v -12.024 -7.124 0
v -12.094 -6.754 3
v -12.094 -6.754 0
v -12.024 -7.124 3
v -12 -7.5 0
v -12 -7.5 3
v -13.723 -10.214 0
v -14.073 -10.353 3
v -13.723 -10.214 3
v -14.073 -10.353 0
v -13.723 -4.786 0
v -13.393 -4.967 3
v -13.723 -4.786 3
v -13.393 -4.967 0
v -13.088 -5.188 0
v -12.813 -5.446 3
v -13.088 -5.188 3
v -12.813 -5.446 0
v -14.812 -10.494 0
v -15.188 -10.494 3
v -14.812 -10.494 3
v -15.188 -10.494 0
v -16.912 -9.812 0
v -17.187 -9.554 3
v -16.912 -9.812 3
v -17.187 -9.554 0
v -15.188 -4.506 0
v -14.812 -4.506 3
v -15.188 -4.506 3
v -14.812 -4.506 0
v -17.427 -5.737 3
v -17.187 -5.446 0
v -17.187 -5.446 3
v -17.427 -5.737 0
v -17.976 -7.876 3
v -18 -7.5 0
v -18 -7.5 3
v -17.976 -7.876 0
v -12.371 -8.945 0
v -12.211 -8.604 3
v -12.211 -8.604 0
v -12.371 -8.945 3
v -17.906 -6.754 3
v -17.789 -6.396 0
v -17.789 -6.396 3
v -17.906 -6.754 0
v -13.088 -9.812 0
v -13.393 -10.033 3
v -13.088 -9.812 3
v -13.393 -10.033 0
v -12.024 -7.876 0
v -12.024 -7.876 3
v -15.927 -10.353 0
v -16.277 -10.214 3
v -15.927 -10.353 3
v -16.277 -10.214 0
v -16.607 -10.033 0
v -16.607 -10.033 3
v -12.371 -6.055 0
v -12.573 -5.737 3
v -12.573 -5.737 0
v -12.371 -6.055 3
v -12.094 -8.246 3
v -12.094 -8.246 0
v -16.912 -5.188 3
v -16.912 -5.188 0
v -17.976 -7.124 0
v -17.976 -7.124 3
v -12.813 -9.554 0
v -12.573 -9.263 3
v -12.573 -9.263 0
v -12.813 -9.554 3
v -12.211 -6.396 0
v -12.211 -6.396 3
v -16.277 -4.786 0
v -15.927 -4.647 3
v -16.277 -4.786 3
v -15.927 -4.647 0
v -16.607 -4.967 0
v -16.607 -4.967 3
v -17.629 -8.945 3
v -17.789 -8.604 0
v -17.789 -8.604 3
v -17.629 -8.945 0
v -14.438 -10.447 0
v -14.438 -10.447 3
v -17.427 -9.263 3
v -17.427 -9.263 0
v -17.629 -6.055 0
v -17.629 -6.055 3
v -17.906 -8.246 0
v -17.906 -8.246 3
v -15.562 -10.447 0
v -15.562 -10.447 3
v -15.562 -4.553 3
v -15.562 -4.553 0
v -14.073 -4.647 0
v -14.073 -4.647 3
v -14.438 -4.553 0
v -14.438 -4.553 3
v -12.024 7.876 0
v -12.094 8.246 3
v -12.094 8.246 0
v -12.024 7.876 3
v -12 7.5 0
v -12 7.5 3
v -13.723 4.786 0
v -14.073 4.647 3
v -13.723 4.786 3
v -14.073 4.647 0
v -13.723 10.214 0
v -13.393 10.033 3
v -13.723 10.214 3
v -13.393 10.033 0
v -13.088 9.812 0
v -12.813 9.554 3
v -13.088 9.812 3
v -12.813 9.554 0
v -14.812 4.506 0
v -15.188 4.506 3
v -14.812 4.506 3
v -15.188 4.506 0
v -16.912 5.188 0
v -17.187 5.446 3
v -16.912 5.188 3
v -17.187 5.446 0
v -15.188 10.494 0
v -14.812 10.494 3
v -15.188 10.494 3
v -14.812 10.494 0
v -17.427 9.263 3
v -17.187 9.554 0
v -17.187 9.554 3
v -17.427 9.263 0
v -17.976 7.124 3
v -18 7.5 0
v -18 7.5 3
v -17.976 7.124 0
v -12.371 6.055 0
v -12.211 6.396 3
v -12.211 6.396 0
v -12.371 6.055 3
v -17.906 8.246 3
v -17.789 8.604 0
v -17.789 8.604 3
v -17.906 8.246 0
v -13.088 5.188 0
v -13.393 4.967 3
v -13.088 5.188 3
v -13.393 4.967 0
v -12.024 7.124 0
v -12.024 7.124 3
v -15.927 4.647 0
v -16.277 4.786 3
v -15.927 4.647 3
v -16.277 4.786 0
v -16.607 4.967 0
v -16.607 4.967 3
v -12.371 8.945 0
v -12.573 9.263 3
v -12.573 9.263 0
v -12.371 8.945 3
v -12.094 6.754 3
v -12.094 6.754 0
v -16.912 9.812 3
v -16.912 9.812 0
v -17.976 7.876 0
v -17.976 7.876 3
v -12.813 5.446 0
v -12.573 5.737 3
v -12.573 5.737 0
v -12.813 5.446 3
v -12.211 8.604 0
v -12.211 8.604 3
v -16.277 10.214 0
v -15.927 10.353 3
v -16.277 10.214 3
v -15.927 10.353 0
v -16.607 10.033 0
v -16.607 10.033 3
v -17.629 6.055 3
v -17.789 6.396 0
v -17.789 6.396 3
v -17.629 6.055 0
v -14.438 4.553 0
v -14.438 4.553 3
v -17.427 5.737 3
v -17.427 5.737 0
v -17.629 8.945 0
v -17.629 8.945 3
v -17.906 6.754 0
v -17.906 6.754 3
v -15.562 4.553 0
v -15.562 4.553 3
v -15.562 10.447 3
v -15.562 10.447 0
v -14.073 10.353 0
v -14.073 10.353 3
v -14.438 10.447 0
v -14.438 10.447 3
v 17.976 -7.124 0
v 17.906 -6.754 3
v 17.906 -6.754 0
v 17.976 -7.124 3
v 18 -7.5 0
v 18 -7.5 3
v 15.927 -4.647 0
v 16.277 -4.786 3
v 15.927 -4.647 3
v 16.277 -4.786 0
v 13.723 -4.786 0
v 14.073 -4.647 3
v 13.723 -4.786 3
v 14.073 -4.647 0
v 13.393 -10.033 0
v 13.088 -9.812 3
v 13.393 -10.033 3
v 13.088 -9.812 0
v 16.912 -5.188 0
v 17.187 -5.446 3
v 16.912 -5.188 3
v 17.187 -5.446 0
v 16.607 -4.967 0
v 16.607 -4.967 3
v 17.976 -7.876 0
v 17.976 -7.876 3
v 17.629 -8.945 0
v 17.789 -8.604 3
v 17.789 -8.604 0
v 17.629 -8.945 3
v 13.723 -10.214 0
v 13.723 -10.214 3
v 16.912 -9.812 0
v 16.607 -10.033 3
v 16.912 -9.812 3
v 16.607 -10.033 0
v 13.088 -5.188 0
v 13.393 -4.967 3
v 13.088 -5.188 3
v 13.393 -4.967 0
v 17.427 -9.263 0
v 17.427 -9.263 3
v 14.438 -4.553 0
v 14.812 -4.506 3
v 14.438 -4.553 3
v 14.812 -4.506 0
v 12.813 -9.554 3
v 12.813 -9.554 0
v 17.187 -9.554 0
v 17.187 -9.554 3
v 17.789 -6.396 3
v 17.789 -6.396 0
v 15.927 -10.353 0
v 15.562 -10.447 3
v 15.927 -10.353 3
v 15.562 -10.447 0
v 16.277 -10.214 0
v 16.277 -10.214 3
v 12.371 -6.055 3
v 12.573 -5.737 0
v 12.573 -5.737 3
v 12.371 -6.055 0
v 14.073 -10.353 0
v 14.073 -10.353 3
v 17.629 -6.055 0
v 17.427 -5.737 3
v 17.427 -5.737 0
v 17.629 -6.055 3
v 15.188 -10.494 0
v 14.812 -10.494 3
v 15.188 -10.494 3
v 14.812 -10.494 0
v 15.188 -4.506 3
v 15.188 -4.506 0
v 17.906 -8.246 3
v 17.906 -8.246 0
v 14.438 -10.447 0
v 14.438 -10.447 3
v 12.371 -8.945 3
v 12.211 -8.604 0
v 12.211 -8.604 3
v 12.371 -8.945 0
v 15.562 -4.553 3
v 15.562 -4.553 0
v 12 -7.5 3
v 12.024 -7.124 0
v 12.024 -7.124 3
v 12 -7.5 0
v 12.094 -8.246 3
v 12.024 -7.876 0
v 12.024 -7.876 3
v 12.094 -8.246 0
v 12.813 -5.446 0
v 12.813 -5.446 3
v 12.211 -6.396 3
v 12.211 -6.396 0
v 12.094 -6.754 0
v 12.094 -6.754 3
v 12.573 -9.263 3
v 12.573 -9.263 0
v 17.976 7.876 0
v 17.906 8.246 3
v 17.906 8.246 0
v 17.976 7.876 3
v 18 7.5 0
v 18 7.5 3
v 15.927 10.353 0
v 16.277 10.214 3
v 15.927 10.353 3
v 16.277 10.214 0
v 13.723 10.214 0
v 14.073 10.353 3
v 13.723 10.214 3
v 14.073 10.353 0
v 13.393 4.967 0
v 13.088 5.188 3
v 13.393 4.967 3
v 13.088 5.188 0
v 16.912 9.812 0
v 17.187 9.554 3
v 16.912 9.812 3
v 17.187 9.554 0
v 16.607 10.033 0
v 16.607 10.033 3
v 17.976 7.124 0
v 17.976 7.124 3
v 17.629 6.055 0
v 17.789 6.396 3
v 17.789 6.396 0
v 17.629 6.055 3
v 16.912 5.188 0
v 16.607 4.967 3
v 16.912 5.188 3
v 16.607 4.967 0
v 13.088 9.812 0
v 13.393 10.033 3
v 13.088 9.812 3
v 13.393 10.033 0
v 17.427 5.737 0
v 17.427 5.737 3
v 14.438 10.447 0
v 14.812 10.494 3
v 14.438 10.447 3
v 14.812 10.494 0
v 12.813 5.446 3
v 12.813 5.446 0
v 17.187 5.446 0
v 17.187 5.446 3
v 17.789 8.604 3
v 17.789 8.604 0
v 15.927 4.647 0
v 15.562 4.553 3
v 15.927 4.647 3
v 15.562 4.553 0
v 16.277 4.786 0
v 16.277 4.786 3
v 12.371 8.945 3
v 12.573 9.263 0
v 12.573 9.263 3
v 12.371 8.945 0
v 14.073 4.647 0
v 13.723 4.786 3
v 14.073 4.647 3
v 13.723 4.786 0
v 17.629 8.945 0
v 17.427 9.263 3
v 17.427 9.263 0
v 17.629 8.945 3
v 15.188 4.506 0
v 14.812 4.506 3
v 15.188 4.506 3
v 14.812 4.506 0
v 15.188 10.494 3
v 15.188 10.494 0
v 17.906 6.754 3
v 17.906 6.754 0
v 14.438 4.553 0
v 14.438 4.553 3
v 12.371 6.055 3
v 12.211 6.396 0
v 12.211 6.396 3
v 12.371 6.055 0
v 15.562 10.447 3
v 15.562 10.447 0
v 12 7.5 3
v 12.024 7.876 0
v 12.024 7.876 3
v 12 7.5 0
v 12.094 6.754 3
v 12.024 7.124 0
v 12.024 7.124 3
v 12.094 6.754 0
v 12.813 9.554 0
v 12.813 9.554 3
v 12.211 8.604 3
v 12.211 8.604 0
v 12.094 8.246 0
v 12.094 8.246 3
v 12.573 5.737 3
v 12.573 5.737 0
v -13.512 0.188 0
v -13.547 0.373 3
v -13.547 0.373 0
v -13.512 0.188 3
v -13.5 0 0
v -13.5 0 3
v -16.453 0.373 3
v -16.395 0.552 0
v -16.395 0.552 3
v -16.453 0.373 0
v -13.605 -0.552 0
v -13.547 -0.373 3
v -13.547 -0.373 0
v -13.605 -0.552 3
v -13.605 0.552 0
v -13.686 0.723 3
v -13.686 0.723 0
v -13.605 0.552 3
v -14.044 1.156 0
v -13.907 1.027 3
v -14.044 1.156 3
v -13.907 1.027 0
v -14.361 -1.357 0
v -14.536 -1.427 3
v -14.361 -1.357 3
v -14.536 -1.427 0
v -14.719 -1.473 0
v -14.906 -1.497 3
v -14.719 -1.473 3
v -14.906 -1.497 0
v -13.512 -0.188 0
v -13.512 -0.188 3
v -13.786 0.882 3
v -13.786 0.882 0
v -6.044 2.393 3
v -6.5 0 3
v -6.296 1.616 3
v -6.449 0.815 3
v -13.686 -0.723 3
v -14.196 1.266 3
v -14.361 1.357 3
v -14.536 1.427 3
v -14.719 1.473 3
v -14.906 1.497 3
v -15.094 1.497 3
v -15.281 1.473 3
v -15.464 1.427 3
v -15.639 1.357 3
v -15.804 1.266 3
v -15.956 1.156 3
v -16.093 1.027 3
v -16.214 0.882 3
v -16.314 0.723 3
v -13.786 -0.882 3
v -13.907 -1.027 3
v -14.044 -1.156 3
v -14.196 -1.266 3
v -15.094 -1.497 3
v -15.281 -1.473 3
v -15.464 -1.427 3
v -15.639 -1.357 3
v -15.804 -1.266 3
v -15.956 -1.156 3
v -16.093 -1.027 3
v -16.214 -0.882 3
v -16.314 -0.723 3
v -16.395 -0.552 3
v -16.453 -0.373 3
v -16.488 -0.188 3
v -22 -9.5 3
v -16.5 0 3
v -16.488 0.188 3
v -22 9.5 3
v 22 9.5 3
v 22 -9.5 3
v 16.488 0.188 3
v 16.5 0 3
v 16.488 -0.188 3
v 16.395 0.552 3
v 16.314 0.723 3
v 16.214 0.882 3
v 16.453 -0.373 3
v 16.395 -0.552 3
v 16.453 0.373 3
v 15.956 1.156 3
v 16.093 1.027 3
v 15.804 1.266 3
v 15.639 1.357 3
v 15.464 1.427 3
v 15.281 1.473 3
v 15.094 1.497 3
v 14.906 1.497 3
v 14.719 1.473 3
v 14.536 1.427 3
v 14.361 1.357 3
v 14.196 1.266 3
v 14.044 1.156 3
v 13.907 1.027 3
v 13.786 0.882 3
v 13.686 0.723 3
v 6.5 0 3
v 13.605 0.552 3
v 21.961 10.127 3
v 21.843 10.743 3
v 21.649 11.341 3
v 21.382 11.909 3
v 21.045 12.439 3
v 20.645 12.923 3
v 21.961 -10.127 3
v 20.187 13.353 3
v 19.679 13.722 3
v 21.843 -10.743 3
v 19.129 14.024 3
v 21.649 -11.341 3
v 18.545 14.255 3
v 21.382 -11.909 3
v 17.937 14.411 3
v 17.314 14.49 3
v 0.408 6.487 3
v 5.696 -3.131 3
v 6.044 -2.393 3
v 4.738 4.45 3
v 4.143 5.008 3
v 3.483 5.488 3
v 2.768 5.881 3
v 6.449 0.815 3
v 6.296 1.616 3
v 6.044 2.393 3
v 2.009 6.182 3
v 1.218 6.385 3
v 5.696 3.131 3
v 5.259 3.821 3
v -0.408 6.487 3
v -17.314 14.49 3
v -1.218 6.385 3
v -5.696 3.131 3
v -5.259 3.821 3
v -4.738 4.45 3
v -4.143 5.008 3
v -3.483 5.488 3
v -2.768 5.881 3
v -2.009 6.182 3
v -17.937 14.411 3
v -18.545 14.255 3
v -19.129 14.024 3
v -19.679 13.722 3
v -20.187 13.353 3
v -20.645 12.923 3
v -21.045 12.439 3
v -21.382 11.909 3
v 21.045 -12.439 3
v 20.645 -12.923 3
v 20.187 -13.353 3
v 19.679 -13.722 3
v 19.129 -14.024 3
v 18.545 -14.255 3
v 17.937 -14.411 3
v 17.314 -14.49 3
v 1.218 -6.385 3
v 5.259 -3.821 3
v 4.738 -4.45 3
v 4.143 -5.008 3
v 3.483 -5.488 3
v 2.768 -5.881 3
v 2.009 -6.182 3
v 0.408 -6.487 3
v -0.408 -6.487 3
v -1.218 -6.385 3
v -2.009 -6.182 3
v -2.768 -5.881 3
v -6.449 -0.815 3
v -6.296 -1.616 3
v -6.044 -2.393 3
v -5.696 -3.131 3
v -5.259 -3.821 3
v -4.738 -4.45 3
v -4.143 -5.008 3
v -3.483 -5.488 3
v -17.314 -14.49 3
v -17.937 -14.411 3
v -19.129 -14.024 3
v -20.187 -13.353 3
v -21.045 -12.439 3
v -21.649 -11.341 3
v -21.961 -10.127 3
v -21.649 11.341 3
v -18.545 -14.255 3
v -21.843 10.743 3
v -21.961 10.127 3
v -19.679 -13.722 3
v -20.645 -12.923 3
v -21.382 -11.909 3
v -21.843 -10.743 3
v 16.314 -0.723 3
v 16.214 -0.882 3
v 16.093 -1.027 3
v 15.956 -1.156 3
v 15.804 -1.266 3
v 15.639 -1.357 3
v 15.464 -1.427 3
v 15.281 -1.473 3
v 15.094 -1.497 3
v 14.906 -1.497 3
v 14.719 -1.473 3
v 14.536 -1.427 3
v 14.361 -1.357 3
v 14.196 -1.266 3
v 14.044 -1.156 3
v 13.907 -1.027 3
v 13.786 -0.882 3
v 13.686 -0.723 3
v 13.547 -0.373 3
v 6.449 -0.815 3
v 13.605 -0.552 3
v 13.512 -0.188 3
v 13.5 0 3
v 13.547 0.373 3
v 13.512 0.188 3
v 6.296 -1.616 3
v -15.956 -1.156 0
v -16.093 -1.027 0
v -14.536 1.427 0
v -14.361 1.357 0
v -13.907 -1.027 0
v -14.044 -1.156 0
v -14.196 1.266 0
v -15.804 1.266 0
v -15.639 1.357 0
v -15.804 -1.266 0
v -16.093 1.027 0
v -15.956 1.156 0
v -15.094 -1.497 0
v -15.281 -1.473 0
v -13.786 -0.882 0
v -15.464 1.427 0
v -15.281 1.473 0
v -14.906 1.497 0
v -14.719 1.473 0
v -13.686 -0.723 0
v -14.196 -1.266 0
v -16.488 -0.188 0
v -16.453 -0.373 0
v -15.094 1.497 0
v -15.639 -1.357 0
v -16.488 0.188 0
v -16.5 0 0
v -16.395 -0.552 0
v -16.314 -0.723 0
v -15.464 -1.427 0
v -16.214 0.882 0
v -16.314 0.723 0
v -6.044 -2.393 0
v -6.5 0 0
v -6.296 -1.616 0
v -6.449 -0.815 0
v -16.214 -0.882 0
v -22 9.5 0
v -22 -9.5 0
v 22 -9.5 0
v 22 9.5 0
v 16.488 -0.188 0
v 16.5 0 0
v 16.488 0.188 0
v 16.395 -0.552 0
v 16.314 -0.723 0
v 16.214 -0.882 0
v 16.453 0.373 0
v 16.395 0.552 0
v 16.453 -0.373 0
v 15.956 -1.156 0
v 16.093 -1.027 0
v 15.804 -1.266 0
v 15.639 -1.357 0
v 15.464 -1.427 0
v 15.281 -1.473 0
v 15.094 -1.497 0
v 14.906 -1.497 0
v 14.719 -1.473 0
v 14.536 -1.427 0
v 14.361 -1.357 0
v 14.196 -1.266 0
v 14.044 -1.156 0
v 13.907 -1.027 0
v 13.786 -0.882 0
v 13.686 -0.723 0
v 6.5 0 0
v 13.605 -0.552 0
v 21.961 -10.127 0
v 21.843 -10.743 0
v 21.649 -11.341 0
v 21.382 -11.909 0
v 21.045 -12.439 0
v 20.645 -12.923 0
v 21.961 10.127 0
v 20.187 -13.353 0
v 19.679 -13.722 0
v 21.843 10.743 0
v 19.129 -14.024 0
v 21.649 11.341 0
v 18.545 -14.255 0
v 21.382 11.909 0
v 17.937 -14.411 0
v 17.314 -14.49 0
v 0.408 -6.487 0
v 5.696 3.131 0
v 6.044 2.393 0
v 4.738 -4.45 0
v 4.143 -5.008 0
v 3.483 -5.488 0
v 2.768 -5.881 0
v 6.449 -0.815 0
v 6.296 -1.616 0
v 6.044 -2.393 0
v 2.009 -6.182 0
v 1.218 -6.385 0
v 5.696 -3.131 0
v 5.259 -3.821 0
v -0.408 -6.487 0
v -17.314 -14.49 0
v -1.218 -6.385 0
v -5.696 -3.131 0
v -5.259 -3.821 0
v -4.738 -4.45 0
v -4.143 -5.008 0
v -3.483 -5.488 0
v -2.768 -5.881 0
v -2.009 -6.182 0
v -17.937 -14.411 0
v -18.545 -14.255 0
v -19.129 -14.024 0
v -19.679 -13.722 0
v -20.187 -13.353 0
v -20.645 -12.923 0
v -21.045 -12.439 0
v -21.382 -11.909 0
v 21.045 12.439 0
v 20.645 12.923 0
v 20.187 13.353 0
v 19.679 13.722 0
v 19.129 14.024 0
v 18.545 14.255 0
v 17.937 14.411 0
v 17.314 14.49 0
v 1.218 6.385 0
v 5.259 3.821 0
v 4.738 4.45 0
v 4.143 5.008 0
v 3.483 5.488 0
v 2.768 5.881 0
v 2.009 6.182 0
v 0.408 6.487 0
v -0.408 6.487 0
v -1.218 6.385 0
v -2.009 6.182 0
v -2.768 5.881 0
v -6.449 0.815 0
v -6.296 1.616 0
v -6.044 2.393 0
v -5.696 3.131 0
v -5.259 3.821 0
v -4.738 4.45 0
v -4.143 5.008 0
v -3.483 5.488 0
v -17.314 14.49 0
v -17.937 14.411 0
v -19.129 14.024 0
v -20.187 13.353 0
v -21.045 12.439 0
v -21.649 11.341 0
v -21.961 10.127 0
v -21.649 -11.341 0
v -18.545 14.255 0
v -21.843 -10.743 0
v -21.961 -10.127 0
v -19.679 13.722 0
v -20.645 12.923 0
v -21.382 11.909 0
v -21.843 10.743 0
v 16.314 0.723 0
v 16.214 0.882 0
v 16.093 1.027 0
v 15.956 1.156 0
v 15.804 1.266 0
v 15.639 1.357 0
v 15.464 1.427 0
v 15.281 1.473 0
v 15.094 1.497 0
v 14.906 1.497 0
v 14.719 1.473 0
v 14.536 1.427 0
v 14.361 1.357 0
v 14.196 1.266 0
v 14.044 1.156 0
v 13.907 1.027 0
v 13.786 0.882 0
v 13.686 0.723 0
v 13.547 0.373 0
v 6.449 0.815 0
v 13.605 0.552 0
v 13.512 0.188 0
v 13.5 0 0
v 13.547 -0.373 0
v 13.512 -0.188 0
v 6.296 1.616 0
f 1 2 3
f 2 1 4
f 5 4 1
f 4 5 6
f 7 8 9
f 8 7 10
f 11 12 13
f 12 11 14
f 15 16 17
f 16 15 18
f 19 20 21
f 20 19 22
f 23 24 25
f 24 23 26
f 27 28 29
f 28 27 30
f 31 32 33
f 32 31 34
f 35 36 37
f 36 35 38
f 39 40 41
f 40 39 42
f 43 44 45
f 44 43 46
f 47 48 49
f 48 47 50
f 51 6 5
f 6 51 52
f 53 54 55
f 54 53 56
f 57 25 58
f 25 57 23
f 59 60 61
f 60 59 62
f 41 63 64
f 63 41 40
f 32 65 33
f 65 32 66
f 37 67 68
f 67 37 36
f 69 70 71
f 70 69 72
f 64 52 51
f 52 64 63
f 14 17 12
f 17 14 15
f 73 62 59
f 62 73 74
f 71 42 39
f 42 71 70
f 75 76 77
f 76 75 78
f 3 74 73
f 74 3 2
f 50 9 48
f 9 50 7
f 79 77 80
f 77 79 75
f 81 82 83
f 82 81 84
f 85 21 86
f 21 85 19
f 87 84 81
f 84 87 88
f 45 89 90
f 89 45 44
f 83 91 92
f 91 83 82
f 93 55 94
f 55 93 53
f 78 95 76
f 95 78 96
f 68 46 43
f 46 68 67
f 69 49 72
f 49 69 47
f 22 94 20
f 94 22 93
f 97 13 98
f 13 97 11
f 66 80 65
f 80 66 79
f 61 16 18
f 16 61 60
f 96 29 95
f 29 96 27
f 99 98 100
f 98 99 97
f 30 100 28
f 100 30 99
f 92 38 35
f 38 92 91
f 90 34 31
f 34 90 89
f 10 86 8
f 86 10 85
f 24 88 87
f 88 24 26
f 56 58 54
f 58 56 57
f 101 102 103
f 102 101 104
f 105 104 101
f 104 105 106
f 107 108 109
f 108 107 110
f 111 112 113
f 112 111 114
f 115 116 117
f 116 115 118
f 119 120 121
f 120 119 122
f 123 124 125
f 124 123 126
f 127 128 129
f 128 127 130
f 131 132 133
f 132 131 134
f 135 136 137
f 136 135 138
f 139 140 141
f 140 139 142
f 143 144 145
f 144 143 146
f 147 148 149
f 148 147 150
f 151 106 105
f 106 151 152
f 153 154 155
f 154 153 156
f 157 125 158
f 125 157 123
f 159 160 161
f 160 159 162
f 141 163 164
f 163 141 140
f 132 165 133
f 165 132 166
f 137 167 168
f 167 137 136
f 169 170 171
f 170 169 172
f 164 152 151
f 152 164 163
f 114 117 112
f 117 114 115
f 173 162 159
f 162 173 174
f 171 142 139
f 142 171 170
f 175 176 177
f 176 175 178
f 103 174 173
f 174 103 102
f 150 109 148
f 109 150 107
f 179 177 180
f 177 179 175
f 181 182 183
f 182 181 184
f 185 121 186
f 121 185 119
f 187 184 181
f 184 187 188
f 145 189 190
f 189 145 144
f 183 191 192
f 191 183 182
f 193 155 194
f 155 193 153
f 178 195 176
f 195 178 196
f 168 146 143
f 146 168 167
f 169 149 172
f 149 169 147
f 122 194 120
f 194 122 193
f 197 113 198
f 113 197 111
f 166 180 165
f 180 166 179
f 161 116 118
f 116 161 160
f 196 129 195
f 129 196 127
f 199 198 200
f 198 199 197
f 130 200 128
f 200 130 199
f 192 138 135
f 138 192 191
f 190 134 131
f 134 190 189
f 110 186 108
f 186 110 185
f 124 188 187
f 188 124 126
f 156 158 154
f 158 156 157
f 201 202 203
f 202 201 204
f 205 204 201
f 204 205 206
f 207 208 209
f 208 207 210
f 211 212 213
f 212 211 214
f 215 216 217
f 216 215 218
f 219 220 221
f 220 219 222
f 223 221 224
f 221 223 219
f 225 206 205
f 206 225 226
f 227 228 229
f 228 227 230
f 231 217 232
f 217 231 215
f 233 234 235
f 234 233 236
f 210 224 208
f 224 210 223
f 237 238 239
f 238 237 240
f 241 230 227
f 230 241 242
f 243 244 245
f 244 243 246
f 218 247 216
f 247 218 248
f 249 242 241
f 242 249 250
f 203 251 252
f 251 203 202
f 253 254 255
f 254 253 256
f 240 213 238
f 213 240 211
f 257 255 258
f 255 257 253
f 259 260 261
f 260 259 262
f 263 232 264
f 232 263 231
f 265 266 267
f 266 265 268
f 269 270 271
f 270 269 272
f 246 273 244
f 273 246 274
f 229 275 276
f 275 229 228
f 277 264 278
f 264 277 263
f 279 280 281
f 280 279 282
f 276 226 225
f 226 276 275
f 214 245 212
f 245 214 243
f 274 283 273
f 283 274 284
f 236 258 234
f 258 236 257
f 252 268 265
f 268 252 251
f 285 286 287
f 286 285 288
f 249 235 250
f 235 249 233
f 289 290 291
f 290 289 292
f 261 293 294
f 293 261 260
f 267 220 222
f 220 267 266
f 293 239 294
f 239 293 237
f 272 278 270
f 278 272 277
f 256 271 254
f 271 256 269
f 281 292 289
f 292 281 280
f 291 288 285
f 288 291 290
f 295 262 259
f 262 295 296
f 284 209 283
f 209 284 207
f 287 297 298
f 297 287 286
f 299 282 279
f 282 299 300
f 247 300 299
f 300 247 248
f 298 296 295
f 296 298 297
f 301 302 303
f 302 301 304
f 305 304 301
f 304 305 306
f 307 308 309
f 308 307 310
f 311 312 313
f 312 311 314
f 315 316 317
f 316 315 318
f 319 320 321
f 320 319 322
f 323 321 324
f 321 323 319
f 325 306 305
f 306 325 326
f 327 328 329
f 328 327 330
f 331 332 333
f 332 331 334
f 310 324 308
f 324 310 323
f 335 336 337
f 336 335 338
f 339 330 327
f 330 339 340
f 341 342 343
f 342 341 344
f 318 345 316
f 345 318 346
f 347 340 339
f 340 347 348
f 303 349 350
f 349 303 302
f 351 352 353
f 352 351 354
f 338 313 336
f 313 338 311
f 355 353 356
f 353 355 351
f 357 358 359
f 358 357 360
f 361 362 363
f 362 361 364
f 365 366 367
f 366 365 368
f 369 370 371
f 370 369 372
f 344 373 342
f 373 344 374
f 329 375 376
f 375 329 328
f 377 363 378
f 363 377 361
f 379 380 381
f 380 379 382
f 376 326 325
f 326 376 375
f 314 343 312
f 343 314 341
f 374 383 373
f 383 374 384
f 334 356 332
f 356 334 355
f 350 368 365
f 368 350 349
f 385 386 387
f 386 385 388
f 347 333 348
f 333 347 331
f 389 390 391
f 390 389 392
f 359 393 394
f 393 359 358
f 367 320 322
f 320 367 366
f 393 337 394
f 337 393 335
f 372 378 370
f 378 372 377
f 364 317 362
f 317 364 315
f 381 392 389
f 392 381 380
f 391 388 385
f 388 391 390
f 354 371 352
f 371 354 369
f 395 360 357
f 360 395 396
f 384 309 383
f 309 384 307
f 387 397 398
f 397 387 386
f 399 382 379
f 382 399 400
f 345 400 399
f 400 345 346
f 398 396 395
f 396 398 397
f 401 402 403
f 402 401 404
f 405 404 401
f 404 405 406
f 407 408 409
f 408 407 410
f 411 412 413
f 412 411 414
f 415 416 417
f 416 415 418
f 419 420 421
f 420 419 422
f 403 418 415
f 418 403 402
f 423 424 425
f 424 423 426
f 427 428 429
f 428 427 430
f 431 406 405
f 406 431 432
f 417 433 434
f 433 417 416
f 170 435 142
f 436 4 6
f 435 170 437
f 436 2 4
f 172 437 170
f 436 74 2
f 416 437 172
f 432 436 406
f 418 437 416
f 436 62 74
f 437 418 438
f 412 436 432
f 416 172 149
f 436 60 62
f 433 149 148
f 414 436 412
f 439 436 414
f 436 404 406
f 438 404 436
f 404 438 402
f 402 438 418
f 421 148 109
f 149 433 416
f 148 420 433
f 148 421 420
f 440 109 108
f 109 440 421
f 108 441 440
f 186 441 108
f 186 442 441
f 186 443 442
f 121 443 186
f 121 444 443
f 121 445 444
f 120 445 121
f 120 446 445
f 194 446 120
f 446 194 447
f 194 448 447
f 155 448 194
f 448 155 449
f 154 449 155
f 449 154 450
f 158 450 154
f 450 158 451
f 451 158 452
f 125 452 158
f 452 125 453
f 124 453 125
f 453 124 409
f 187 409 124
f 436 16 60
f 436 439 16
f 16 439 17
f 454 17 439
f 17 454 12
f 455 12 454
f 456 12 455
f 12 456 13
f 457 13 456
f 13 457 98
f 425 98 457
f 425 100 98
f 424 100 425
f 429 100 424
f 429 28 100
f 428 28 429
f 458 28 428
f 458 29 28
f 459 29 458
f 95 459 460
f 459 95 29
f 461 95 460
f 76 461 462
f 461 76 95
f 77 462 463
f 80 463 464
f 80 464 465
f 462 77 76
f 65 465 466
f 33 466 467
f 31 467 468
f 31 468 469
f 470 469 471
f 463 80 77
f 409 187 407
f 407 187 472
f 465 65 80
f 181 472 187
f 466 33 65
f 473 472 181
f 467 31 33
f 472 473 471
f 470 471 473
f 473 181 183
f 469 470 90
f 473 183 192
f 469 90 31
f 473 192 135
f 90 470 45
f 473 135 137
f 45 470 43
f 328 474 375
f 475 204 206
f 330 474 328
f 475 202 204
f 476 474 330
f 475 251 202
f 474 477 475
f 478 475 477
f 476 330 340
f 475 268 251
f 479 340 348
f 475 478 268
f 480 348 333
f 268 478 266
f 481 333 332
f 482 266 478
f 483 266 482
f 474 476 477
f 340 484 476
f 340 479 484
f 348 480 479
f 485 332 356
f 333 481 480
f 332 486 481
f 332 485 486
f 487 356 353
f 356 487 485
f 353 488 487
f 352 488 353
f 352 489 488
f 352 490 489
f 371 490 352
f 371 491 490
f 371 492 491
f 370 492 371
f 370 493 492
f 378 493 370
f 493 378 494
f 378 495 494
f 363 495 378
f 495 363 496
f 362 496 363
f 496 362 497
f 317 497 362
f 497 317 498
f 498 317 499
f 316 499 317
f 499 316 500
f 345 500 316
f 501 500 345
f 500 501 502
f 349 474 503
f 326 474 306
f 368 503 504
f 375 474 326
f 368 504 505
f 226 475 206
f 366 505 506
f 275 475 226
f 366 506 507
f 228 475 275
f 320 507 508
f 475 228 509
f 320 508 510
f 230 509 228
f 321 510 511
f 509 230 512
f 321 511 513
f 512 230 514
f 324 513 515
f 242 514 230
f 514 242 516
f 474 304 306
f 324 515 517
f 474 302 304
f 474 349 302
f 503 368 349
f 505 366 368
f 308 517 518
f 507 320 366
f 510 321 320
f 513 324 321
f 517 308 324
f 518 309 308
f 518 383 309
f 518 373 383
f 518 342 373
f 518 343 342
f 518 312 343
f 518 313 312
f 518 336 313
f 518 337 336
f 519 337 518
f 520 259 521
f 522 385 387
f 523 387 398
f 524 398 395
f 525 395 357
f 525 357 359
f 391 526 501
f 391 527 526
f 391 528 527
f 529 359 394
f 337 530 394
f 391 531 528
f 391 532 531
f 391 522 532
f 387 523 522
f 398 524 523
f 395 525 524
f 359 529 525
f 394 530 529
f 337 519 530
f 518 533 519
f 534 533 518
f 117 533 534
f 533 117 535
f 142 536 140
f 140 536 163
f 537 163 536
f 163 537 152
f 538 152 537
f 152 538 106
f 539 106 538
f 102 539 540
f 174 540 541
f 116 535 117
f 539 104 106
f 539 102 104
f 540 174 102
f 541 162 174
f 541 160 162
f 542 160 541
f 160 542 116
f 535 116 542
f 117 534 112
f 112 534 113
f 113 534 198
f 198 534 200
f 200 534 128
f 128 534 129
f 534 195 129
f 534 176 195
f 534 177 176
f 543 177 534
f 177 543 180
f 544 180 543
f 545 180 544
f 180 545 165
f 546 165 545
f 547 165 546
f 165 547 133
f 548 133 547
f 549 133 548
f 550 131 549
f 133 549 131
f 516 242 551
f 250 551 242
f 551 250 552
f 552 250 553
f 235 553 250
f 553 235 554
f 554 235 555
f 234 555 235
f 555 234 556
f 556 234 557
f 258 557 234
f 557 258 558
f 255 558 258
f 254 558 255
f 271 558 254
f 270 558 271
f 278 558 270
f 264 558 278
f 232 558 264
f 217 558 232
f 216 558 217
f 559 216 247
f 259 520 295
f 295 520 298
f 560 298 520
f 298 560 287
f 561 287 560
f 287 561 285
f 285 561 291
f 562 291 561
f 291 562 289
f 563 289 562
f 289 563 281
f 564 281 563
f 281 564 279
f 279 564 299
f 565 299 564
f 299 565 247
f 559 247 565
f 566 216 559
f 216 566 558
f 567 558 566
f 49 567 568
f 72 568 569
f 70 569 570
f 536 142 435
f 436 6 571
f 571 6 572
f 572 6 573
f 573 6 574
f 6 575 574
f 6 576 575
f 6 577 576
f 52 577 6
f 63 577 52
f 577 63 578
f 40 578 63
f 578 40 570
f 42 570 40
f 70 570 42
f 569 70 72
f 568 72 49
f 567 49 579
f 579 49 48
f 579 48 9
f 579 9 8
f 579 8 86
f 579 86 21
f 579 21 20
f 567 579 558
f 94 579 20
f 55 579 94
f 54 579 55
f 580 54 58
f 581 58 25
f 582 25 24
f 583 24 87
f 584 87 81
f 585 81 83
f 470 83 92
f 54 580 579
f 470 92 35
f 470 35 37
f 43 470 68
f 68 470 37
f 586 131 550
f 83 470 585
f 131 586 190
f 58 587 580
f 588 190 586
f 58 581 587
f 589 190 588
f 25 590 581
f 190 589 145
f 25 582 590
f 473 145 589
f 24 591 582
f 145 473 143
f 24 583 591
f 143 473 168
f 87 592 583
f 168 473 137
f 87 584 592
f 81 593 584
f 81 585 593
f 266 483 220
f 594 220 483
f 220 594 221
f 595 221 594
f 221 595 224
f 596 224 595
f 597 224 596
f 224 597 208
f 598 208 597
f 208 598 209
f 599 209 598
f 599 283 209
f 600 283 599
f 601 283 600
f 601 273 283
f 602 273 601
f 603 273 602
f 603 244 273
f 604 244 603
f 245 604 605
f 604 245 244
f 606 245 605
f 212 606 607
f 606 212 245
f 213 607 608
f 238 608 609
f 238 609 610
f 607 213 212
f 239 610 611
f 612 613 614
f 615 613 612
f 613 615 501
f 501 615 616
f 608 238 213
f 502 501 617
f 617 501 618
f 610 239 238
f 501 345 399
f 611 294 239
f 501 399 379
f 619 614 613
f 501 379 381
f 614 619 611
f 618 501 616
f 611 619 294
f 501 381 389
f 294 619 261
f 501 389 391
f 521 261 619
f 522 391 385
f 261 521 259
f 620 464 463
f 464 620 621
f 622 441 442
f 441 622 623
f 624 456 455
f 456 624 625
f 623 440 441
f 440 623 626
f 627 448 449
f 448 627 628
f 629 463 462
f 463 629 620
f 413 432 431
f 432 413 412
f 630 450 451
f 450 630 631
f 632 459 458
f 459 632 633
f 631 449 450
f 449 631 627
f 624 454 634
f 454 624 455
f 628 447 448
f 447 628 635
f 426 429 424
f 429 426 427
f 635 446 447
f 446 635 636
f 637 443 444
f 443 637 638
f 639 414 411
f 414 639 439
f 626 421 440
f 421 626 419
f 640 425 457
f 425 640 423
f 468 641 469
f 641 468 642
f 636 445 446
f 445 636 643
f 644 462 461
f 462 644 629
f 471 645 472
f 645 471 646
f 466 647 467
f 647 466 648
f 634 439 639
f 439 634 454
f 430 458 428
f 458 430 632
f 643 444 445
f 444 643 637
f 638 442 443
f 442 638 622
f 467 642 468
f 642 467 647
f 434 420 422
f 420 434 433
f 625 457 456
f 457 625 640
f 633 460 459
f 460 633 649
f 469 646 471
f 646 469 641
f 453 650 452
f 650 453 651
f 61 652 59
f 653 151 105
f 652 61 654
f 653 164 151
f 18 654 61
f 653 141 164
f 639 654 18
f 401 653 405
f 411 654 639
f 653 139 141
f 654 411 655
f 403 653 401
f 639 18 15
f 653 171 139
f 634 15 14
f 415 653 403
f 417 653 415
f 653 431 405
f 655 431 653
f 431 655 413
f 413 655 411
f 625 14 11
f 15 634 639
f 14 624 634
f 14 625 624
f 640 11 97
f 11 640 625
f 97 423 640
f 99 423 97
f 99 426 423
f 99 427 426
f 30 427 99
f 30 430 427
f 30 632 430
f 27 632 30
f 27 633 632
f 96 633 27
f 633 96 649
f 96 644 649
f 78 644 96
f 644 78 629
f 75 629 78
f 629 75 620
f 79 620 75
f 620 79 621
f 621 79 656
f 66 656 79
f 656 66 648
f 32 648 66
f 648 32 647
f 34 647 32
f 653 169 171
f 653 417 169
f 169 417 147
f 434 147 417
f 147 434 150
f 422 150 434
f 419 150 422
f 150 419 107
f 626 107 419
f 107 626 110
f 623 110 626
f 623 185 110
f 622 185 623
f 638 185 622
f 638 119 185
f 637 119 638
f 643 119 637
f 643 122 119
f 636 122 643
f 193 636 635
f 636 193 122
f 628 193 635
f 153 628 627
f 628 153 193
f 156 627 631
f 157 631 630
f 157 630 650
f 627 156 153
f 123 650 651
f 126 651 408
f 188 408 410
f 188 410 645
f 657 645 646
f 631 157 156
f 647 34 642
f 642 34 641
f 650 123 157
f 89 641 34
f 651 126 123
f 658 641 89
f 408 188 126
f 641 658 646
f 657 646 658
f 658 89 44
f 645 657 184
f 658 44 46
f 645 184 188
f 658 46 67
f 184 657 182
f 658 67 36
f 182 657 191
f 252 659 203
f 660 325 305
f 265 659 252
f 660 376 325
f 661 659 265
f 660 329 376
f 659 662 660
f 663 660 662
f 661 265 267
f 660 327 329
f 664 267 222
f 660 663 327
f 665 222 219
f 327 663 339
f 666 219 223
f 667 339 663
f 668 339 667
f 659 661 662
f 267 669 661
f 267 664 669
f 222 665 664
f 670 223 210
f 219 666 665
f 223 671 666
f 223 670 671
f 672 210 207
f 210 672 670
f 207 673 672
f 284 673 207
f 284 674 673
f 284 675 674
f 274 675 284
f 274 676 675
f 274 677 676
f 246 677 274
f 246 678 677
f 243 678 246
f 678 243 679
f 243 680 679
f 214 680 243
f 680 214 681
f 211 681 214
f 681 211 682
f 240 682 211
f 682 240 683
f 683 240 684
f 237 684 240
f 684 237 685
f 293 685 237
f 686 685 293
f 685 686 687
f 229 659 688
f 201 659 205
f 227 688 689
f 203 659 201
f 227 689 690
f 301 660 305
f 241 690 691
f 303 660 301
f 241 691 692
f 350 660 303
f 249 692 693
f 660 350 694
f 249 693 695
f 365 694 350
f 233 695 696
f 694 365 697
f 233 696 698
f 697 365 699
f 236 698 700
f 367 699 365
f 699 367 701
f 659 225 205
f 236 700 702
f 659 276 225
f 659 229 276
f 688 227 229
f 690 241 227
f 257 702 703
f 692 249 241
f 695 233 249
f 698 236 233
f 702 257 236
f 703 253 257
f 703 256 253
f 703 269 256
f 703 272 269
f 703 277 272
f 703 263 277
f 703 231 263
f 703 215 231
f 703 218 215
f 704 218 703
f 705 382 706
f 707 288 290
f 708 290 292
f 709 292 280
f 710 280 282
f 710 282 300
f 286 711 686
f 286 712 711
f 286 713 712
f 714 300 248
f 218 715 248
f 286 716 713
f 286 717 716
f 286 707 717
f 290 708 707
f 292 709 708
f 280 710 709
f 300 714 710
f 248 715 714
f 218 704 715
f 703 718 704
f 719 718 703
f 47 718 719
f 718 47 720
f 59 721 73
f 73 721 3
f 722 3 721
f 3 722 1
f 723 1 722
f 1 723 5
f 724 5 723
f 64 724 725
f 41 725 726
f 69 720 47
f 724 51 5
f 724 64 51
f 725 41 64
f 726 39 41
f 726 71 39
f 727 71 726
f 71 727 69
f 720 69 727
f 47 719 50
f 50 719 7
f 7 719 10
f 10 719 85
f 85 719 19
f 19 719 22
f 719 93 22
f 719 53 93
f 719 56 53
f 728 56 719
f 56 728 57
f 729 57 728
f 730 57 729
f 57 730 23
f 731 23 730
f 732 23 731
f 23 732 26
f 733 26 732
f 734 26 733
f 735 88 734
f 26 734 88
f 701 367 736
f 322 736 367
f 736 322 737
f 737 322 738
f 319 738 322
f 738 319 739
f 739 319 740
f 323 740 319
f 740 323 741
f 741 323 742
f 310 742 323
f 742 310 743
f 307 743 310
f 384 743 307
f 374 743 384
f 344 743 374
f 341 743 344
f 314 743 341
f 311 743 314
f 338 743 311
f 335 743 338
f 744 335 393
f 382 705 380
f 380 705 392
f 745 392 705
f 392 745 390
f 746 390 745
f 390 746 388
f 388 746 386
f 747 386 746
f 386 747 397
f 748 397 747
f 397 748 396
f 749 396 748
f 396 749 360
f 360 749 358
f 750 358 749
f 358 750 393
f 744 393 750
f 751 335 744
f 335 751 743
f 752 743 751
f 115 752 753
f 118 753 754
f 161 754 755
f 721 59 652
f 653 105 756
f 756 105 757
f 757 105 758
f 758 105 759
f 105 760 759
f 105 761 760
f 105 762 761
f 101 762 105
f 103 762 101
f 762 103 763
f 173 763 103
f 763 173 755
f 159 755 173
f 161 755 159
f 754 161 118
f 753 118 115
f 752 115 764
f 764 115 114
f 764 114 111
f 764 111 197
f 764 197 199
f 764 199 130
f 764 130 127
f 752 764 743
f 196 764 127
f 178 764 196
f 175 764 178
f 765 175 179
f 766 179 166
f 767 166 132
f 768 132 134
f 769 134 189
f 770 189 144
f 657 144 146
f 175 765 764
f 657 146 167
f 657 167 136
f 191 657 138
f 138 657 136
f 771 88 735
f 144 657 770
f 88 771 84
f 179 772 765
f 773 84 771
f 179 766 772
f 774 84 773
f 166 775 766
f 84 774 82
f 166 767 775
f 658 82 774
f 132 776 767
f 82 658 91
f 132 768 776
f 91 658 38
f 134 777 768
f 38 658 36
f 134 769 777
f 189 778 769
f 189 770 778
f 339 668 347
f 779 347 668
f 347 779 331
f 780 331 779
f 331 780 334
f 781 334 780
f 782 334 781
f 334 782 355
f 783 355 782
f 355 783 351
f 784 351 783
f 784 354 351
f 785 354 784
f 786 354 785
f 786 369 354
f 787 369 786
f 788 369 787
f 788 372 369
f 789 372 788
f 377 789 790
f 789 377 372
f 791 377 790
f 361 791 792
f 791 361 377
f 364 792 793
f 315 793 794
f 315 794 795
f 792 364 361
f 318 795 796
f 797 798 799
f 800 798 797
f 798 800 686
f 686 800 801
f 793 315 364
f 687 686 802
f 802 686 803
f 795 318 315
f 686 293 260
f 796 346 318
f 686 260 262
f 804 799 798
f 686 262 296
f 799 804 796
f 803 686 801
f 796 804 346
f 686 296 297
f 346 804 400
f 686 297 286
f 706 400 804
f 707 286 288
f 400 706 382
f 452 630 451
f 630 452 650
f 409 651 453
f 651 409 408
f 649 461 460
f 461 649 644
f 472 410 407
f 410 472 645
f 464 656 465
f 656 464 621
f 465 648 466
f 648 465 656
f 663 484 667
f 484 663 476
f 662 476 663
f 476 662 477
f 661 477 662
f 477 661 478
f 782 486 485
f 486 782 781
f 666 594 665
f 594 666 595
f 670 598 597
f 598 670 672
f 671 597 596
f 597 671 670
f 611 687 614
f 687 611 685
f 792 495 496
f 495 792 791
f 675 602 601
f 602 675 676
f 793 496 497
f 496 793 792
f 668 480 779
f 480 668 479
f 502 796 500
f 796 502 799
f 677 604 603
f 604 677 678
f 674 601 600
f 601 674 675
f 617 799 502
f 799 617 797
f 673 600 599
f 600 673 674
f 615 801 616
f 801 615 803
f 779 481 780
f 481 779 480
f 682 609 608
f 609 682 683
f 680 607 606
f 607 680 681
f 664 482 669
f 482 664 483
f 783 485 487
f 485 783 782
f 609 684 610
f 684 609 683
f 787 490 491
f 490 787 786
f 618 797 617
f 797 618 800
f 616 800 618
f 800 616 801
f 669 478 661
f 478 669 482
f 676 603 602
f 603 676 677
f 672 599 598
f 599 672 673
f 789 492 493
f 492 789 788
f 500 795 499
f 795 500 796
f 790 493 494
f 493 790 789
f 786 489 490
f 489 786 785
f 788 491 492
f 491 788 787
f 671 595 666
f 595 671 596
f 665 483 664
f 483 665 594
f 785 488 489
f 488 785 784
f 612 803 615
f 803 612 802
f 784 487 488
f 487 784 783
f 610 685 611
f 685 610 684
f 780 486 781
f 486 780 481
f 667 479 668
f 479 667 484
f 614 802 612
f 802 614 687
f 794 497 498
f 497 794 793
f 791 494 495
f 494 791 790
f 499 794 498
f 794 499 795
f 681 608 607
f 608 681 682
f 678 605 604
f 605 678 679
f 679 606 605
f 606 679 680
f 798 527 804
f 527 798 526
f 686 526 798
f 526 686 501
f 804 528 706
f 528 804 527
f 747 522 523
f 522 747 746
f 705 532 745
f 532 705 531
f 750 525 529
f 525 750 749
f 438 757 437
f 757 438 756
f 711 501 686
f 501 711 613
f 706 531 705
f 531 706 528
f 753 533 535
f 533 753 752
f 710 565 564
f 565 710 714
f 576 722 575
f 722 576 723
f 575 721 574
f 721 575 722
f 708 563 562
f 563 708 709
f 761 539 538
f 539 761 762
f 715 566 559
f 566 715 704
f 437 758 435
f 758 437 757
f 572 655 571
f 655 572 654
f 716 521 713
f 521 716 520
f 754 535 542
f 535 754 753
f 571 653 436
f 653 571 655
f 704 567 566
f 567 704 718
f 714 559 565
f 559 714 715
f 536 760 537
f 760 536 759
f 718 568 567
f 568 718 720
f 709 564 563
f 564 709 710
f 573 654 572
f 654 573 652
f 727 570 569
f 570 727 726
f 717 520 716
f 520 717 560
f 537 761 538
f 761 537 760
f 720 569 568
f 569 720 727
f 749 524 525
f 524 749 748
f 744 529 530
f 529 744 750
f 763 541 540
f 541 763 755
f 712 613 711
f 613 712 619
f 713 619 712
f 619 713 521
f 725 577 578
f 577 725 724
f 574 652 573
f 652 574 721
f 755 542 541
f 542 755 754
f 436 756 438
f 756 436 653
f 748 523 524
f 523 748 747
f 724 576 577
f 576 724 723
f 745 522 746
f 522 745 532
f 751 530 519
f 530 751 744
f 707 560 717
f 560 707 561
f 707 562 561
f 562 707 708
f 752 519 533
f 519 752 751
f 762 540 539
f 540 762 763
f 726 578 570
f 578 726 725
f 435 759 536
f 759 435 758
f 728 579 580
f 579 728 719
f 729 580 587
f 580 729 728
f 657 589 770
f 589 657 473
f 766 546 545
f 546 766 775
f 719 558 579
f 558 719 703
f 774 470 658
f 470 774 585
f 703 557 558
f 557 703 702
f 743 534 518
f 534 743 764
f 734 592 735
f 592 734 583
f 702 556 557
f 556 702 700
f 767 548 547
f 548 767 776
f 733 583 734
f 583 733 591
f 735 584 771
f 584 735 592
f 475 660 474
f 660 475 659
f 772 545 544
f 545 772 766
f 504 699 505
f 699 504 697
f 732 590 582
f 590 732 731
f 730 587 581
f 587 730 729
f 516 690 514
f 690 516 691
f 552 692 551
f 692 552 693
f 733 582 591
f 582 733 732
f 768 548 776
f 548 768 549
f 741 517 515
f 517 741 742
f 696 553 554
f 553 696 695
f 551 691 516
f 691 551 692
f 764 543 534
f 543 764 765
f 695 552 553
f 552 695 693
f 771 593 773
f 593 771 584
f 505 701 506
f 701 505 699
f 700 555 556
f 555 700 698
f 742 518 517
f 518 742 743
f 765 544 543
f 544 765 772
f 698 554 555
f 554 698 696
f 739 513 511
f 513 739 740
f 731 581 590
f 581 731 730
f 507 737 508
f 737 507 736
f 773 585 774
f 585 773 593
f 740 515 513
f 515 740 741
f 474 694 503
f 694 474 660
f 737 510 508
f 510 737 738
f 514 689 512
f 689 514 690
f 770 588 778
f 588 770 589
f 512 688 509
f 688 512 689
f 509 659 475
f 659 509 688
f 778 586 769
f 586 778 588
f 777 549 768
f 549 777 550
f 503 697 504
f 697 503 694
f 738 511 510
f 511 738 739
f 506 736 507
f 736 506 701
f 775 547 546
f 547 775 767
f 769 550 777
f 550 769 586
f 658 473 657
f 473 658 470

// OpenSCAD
$fn = 50;


difference() {
	union() {
		hull() {
			translate(v = [-17.0000000000, 9.5000000000, 0]) {
				cylinder(h = 3, r = 5);
			}
			translate(v = [17.0000000000, 9.5000000000, 0]) {
				cylinder(h = 3, r = 5);
			}
			translate(v = [-17.0000000000, -9.5000000000, 0]) {
				cylinder(h = 3, r = 5);
			}
			translate(v = [17.0000000000, -9.5000000000, 0]) {
				cylinder(h = 3, r = 5);
			}
		}
	}
	union() {
		#translate(v = [-15.0000000000, -7.5000000000, 0]) {
			cylinder(h = 3, r = 3.0000000000);
		}
		#translate(v = [-15.0000000000, 7.5000000000, 0]) {
			cylinder(h = 3, r = 3.0000000000);
		}
		#translate(v = [15.0000000000, -7.5000000000, 0]) {
			cylinder(h = 3, r = 3.0000000000);
		}
		#translate(v = [15.0000000000, 7.5000000000, 0]) {
			cylinder(h = 3, r = 3.0000000000);
		}
		#translate(v = [-15.0000000000, -7.5000000000, -100.0000000000]) {
			cylinder(h = 200, r = 3.0000000000);
		}
		#translate(v = [-15.0000000000, 7.5000000000, -100.0000000000]) {
			cylinder(h = 200, r = 3.0000000000);
		}
		#translate(v = [15.0000000000, -7.5000000000, -100.0000000000]) {
			cylinder(h = 200, r = 3.0000000000);
		}
		#translate(v = [15.0000000000, 7.5000000000, -100.0000000000]) {
			cylinder(h = 200, r = 3.0000000000);
		}
		#translate(v = [-15.0000000000, -7.5000000000, 0]) {
			cylinder(h = 3, r = 1.5000000000);
		}
		#translate(v = [-15.0000000000, 0.0000000000, 0]) {
			cylinder(h = 3, r = 1.5000000000);
		}
		#translate(v = [-15.0000000000, 7.5000000000, 0]) {
			cylinder(h = 3, r = 1.5000000000);
		}
		#translate(v = [15.0000000000, -7.5000000000, 0]) {
			cylinder(h = 3, r = 1.5000000000);
		}
		#translate(v = [15.0000000000, 0.0000000000, 0]) {
			cylinder(h = 3, r = 1.5000000000);
		}
		#translate(v = [15.0000000000, 7.5000000000, 0]) {
			cylinder(h = 3, r = 1.5000000000);
		}
		#translate(v = [-15.0000000000, -7.5000000000, 0]) {
			cylinder(h = 3, r = 1.5000000000);
		}
		#translate(v = [-15.0000000000, 0.0000000000, 0]) {
			cylinder(h = 3, r = 1.5000000000);
		}
		#translate(v = [-15.0000000000, 7.5000000000, 0]) {
			cylinder(h = 3, r = 1.5000000000);
		}
		#translate(v = [15.0000000000, -7.5000000000, 0]) {
			cylinder(h = 3, r = 1.5000000000);
		}
		#translate(v = [15.0000000000, 0.0000000000, 0]) {
			cylinder(h = 3, r = 1.5000000000);
		}
		#translate(v = [15.0000000000, 7.5000000000, 0]) {
			cylinder(h = 3, r = 1.5000000000);
		}
		#translate(v = [-15.0000000000, -7.5000000000, 0]) {
			cylinder(h = 3, r = 1.5000000000);
		}
		#translate(v = [-15.0000000000, 0.0000000000, 0]) {
			cylinder(h = 3, r = 1.5000000000);
		}
		#translate(v = [-15.0000000000, 7.5000000000, 0]) {
			cylinder(h = 3, r = 1.5000000000);
		}
		#translate(v = [15.0000000000, -7.5000000000, 0]) {
			cylinder(h = 3, r = 1.5000000000);
		}
		#translate(v = [15.0000000000, 0.0000000000, 0]) {
			cylinder(h = 3, r = 1.5000000000);
		}
		#translate(v = [15.0000000000, 7.5000000000, 0]) {
			cylinder(h = 3, r = 1.5000000000);
		}
		#cylinder(h = 3, r = 6.5000000000);
	}
}
